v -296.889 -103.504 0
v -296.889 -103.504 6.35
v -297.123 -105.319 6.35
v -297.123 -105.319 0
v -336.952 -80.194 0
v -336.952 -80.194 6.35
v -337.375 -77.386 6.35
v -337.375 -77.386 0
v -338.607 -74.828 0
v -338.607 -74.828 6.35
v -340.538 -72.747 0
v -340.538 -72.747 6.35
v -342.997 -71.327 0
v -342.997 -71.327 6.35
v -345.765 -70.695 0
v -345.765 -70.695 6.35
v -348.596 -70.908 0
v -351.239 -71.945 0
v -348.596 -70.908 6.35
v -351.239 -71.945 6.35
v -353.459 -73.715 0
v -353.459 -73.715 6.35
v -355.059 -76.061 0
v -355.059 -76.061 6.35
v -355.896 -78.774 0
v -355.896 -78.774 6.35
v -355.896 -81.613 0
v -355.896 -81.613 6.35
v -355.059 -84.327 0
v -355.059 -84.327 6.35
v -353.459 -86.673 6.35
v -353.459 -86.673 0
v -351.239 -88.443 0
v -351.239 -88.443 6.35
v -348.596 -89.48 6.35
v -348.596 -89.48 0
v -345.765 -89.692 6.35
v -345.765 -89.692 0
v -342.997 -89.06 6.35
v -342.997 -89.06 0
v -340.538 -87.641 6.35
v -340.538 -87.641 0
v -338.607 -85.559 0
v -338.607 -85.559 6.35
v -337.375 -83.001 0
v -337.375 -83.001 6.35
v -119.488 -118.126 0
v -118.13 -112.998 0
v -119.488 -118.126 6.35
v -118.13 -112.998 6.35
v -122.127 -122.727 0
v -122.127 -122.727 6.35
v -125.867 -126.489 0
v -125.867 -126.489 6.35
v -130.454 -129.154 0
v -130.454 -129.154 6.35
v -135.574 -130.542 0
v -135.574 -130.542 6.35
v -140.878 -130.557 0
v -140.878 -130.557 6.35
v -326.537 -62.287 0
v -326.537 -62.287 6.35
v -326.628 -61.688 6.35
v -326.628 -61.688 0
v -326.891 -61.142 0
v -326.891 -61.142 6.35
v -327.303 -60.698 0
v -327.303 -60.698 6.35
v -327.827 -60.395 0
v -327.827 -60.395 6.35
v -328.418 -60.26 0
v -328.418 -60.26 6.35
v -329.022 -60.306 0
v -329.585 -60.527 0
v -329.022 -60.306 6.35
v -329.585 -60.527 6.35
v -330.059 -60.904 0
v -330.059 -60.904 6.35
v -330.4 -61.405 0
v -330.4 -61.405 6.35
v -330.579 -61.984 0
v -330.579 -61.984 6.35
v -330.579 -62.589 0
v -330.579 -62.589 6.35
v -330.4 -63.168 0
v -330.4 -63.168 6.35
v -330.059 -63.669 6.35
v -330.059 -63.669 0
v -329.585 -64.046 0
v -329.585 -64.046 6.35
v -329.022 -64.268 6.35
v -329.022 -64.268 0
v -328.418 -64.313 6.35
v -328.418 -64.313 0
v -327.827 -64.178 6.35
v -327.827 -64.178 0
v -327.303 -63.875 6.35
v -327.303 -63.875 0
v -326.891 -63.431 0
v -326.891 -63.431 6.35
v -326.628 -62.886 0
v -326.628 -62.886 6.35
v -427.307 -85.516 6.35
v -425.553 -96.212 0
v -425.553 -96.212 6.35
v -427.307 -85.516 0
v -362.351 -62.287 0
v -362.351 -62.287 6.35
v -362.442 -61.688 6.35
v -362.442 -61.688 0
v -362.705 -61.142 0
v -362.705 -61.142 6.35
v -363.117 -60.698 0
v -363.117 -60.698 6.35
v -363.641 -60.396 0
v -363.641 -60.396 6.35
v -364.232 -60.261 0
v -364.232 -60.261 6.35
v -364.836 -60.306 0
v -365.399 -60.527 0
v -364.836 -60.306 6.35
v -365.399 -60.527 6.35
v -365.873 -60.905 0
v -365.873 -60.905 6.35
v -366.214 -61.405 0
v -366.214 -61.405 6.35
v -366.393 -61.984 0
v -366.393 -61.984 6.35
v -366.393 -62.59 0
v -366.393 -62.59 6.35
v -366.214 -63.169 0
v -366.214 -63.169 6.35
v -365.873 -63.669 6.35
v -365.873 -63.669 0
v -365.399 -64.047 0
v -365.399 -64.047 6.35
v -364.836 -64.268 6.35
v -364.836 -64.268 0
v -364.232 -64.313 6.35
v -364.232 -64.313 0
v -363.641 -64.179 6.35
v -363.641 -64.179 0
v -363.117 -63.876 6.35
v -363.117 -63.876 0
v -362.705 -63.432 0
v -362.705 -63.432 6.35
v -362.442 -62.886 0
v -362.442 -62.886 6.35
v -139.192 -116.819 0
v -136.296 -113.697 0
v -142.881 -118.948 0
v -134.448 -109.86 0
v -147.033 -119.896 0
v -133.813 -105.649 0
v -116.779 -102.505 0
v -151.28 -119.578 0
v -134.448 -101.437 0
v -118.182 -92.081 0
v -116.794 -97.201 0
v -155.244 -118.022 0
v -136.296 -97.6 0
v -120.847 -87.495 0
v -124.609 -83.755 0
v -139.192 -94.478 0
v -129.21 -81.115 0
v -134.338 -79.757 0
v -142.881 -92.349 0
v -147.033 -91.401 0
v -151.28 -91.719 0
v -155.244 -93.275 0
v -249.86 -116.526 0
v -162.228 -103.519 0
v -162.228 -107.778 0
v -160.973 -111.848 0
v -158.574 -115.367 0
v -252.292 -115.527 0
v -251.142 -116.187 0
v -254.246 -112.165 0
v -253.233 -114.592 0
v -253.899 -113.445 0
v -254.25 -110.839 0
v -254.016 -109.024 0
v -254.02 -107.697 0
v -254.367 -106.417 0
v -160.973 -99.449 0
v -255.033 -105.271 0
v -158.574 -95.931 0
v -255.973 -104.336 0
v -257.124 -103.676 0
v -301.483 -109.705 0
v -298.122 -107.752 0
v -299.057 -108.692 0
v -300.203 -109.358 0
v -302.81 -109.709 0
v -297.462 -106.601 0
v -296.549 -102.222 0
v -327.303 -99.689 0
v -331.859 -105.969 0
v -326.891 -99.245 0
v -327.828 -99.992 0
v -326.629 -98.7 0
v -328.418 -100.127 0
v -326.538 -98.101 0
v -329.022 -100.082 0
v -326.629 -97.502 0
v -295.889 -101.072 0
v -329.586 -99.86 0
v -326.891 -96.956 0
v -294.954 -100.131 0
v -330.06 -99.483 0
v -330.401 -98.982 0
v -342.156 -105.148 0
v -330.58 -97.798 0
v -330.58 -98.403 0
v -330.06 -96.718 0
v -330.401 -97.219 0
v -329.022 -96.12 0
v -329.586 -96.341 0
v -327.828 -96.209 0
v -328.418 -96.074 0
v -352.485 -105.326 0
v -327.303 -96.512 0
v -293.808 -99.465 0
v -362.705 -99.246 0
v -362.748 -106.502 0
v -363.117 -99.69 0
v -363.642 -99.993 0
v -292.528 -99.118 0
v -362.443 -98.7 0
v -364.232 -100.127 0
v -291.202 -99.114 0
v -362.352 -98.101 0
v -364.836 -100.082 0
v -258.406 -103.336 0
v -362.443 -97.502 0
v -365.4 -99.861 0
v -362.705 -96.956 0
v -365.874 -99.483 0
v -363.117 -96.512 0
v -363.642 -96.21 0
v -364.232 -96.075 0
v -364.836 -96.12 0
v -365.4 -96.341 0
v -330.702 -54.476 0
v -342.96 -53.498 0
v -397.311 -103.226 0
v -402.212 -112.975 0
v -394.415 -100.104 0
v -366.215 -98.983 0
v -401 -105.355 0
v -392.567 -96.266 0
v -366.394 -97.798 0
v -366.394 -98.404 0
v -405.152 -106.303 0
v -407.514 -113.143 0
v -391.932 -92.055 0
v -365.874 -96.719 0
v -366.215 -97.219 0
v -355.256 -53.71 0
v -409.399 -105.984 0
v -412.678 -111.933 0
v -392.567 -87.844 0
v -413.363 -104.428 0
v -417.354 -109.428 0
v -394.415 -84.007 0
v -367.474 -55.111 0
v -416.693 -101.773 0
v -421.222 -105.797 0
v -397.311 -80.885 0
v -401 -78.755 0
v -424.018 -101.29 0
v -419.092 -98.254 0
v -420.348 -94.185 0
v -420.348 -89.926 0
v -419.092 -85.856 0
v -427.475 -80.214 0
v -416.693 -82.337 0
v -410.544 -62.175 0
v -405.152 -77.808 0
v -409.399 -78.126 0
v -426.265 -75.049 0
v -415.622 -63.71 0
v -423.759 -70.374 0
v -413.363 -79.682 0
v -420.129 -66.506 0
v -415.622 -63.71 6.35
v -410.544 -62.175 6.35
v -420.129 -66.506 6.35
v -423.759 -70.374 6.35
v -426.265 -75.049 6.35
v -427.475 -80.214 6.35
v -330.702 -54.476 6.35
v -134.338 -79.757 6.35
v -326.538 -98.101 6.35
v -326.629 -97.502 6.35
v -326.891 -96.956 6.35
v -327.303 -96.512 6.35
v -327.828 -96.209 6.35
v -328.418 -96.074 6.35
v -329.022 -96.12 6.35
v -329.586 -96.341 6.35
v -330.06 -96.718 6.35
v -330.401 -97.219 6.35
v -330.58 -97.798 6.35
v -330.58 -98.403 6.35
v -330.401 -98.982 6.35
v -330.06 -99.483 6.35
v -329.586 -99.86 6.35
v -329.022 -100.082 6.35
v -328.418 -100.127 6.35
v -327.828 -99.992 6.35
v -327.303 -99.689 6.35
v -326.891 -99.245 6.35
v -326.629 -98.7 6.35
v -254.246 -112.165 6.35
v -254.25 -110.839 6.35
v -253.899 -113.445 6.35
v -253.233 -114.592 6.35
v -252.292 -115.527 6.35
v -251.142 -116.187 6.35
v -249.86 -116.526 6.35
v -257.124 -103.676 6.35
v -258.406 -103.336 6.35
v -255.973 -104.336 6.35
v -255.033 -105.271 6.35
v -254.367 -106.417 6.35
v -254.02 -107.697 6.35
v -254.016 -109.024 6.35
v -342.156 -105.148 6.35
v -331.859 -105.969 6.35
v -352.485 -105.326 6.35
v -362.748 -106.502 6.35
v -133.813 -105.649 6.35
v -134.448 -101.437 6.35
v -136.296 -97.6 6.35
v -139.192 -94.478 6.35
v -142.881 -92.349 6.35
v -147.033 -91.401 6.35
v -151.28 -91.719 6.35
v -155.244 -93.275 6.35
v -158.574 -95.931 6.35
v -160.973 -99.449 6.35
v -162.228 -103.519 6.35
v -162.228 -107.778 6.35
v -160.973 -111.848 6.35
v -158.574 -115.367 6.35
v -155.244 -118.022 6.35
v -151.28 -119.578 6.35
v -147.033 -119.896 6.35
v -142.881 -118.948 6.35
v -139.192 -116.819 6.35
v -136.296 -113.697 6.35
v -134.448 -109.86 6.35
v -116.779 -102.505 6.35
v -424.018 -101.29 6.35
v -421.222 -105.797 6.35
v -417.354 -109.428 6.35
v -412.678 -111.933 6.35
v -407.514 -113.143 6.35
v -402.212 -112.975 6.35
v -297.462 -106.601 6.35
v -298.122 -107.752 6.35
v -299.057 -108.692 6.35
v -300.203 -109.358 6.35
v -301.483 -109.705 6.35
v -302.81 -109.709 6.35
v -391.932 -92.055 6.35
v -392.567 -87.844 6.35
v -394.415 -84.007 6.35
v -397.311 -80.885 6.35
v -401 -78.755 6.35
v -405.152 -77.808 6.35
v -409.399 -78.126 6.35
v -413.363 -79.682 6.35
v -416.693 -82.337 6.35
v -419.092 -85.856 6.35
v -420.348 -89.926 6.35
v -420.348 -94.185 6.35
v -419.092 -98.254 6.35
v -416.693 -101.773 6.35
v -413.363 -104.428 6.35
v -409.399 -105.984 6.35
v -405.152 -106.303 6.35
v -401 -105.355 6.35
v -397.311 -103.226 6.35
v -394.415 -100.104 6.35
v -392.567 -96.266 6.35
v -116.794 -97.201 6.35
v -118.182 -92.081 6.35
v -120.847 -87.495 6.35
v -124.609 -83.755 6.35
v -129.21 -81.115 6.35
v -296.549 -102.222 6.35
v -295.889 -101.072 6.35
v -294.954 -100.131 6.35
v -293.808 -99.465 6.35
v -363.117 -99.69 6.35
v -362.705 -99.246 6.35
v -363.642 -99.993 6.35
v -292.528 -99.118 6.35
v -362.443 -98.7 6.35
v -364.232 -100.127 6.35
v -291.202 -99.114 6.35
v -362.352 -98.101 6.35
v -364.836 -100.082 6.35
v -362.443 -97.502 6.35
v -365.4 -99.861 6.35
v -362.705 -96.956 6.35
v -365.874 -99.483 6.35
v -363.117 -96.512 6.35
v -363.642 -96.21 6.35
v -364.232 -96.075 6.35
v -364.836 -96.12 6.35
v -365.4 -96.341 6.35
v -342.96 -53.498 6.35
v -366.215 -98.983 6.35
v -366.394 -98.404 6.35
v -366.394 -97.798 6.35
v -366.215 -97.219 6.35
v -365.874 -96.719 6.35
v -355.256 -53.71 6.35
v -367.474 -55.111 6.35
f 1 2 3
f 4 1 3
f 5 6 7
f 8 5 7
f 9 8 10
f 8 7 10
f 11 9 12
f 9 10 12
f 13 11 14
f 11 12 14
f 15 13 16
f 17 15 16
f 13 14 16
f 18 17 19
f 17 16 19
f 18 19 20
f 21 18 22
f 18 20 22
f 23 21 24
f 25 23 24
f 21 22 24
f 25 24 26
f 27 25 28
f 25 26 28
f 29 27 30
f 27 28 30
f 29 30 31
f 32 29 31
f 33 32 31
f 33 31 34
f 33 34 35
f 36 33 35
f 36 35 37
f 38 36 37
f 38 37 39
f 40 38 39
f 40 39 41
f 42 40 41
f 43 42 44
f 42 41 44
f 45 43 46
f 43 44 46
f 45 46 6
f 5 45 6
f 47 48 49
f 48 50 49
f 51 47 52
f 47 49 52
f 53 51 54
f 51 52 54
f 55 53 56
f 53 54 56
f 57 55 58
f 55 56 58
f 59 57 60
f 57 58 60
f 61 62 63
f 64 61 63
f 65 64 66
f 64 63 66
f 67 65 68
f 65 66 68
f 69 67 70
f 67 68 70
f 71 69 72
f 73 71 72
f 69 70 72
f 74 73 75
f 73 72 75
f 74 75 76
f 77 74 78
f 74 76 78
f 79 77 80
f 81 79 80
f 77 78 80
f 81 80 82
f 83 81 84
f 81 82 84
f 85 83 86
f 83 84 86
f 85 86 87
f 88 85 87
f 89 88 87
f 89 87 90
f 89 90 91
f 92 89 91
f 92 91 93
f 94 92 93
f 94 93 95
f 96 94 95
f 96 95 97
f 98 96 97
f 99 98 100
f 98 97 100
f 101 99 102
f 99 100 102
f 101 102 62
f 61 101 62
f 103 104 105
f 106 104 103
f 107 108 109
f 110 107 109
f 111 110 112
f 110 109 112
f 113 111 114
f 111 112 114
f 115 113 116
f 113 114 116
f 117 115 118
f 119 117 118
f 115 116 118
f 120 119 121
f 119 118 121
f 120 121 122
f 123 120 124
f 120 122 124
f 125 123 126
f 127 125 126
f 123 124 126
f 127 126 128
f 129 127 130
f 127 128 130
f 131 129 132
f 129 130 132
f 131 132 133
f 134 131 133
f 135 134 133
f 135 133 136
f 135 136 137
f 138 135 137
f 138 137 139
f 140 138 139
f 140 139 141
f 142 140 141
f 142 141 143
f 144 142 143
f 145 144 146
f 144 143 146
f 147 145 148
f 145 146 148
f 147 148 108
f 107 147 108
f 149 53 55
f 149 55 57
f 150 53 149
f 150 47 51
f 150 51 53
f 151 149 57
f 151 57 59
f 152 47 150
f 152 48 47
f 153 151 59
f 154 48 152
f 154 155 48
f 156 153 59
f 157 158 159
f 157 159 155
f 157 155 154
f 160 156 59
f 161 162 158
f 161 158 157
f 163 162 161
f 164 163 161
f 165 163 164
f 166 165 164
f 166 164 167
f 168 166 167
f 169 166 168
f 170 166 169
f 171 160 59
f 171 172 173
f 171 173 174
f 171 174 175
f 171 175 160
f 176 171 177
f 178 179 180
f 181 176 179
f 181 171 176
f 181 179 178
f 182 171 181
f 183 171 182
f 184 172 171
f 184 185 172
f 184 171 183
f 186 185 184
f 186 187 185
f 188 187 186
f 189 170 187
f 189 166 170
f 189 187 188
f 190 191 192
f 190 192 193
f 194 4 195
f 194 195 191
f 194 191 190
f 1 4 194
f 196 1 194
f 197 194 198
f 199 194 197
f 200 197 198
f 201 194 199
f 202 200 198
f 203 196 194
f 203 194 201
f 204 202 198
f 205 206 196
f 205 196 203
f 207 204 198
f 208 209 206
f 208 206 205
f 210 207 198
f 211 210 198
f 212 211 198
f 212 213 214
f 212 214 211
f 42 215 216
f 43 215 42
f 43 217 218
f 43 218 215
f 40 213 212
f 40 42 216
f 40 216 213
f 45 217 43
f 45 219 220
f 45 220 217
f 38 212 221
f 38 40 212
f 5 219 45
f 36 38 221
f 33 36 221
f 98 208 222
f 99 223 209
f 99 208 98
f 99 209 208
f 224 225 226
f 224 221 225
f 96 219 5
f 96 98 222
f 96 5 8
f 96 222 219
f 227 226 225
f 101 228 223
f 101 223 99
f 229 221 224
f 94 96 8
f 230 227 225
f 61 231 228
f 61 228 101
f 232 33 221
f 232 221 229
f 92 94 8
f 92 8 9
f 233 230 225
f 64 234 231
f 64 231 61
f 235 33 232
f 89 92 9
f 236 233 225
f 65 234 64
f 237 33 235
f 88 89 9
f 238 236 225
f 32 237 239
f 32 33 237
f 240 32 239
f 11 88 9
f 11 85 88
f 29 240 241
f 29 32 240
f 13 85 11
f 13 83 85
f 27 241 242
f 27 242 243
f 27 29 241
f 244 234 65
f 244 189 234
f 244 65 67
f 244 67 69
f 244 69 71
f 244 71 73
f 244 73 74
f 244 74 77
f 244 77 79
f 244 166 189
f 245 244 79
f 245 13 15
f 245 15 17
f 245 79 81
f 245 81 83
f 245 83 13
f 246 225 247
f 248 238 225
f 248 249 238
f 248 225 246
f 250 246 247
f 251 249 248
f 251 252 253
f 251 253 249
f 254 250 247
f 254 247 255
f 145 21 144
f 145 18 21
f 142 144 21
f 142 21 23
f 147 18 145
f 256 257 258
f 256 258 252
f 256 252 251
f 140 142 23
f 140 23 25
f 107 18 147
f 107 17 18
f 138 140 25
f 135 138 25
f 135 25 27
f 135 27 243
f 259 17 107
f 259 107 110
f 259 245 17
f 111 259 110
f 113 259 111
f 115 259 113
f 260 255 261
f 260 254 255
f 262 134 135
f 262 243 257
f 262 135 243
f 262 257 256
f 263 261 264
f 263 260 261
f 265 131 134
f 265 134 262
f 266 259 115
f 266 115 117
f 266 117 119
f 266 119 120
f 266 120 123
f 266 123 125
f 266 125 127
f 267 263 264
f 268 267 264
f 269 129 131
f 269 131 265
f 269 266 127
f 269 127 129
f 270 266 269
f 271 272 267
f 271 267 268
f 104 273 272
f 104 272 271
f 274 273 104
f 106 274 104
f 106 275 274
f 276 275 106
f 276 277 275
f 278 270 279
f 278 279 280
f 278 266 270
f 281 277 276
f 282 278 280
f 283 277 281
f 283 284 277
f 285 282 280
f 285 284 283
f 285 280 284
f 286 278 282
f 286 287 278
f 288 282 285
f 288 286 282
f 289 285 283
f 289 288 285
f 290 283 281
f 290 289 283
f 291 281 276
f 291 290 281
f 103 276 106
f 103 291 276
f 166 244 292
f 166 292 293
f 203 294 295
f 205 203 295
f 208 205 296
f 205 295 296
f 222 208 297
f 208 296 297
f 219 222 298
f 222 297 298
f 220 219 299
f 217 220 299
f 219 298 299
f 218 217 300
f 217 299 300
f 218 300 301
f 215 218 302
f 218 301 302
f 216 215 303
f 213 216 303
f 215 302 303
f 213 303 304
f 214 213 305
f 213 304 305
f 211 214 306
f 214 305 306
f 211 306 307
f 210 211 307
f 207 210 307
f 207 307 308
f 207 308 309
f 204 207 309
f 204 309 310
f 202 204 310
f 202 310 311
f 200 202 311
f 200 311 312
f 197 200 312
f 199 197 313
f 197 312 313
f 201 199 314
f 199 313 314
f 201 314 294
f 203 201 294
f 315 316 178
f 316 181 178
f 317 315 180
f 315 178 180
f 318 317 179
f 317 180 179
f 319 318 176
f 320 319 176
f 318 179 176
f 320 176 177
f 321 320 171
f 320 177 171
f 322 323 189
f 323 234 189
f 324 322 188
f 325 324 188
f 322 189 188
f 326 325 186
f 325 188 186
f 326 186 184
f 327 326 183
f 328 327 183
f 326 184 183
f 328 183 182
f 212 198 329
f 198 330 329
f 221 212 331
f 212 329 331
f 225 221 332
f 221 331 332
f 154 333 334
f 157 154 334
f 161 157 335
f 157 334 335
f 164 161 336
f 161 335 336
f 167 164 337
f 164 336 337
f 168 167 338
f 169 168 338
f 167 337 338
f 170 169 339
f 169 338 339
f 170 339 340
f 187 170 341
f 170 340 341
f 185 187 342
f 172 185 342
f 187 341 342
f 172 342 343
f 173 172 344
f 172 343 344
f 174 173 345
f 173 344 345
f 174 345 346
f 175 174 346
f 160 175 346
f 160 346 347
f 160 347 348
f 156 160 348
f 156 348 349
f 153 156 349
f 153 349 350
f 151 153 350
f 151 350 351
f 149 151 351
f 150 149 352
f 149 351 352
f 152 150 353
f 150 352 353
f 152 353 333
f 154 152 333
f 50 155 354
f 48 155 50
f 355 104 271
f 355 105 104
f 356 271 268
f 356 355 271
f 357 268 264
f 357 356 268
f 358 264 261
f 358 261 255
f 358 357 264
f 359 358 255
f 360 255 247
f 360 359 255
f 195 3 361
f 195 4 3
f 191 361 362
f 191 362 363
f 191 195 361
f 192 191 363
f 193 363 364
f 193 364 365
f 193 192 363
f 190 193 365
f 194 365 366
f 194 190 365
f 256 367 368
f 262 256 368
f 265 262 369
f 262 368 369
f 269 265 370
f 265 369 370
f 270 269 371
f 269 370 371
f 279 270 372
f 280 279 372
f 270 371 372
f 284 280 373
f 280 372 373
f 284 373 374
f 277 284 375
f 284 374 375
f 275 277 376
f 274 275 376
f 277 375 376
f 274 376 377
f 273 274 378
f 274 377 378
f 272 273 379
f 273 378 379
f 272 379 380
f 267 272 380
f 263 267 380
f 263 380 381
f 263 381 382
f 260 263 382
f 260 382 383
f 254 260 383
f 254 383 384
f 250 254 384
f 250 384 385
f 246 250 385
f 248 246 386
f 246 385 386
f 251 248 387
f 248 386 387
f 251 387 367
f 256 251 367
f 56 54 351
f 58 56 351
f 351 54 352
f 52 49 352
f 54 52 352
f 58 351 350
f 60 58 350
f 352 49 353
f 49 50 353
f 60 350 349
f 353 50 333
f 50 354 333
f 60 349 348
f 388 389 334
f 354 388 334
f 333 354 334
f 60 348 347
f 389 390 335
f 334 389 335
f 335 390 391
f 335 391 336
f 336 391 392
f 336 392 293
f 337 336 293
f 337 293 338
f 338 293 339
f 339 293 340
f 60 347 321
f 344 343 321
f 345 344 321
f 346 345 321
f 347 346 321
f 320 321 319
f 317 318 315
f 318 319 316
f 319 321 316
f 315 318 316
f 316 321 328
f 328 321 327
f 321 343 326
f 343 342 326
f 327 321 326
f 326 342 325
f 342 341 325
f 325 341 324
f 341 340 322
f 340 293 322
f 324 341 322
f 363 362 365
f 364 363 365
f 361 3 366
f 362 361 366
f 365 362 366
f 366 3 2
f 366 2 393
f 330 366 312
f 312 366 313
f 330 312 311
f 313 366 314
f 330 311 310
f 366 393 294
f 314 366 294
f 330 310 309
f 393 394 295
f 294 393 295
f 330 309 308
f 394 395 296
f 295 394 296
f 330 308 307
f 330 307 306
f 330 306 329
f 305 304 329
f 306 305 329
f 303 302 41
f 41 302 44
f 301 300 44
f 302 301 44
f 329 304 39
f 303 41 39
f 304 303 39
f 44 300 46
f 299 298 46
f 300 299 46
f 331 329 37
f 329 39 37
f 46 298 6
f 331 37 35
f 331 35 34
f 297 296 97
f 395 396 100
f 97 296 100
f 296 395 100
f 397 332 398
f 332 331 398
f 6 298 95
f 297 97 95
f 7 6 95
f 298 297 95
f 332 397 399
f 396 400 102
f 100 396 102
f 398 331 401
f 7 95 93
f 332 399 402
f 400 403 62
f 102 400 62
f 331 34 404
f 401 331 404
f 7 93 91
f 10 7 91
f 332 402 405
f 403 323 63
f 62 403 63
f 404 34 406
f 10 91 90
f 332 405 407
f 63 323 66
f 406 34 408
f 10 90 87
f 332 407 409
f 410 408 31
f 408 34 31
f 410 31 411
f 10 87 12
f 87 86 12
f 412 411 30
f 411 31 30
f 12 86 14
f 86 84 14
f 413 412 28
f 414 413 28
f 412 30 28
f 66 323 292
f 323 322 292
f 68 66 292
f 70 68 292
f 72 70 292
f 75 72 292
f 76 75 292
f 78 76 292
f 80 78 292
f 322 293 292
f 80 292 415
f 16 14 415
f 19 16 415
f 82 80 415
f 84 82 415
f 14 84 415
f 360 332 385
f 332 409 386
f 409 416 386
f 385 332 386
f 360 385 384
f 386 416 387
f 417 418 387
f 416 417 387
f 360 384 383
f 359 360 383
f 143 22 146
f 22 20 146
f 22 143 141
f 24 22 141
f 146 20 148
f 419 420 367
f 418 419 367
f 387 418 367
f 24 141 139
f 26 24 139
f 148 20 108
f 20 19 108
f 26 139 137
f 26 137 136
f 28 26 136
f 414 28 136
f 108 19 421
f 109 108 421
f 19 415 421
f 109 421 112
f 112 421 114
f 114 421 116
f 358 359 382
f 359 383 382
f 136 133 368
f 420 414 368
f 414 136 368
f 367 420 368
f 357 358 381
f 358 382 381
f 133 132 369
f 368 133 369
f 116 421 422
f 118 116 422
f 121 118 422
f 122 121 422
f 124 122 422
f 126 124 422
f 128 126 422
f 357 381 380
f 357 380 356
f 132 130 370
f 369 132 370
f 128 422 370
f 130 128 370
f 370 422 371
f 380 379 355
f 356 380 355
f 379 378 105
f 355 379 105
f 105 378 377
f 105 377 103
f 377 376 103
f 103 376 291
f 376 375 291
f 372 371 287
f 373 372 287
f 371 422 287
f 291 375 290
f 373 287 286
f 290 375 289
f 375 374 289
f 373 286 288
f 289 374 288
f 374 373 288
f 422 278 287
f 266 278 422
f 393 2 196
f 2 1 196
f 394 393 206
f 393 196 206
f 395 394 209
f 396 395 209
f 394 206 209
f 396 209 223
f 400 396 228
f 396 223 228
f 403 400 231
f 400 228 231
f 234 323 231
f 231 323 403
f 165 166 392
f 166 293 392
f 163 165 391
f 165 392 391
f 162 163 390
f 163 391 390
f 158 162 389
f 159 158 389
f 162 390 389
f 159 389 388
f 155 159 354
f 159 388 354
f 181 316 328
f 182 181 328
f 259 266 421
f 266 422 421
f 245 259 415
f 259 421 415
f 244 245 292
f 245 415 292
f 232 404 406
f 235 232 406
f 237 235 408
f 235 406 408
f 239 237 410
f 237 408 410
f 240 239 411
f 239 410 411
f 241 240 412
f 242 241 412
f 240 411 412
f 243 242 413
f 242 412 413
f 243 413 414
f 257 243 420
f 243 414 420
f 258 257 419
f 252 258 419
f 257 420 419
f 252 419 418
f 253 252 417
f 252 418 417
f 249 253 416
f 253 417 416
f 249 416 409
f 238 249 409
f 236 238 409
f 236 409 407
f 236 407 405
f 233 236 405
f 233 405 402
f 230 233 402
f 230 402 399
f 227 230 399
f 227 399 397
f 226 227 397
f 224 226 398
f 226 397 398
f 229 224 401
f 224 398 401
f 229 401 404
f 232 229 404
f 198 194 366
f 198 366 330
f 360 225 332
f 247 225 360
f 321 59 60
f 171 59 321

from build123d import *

# Parameters (mm, degrees)
BOSS_EXTRUDE4_DEPTH = 6.35
SKETCH8_R           = 14.2875
SKETCH8_R_2         = 2.032
SKETCH8_R_3         = 9.525
CUT_EXTRUDE7_DEPTH  = 6.35
FILLET1_R           = 127
FILLET2_R           = 20.32
FILLET3_R           = 20.32
FILLET4_R           = 20.32
FILLET5_R           = 20.32
FILLET6_R           = 106.68
FILLET15_R          = 5.08
FILLET16_R          = 5.08
FILLET17_R          = 5.08
FILLET18_R          = 5.08


with BuildPart() as part:
    # Sketch6 → Boss-Extrude4 (new body)
    with BuildSketch(Plane.XY):
        Polygon((-430.595798314, -65.46403997), (-349.134252231, -52.10293935), (-114.184252231, -82.35181316), (-120.72454927, -133.15181316), (-347.342471816, -103.975661033), (-422.26372086, -116.26403997), align=None)
    extrude(amount=BOSS_EXTRUDE4_DEPTH)

    # Sketch8 → Cut-Extrude7 (cut)
    with BuildSketch(Plane.XY.offset(6.35)):
        with Locations((-406.219595957, -92.055134427)):
            Circle(SKETCH8_R)
        with Locations((-148.100562805, -105.64860282)):
            Circle(SKETCH8_R)
        with Locations((-364.383471272, -62.287100468)):
            Circle(SKETCH8_R_2)
        with Locations((-364.384308881, -98.101100468)):
            Circle(SKETCH8_R_2)
        with Locations((-328.570308884, -98.10061012)):
            Circle(SKETCH8_R_2)
        with Locations((-328.569471275, -62.28661013)):
            Circle(SKETCH8_R_2)
        with Locations((-346.476890078, -80.193855294)):
            Circle(SKETCH8_R_3)
        Polygon((-254.89844174, -115.877460566), (-253.367356027, -103.985163664), (-296.240101937, -98.465468917), (-297.77118765, -110.357765819), align=None)
    extrude(amount=-CUT_EXTRUDE7_DEPTH, mode=Mode.SUBTRACT)

    # Fillet1
    fillet1_edges = [part.edges().sort_by_distance(p)[0] for p in [
        (-349.134252231, -52.10293935, 3.175),
    ]]
    fillet(fillet1_edges, radius=FILLET1_R)

    # Fillet2
    fillet2_edges = [part.edges().sort_by_distance(p)[0] for p in [
        (-430.595798314, -65.46403997, 3.175),
    ]]
    fillet(fillet2_edges, radius=FILLET2_R)

    # Fillet3
    fillet3_edges = [part.edges().sort_by_distance(p)[0] for p in [
        (-422.26372086, -116.26403997, 3.175),
    ]]
    fillet(fillet3_edges, radius=FILLET3_R)

    # Fillet4
    fillet4_edges = [part.edges().sort_by_distance(p)[0] for p in [
        (-114.184252231, -82.35181316, 3.175),
    ]]
    fillet(fillet4_edges, radius=FILLET4_R)

    # Fillet5
    fillet5_edges = [part.edges().sort_by_distance(p)[0] for p in [
        (-120.72454927, -133.15181316, 3.175),
    ]]
    fillet(fillet5_edges, radius=FILLET5_R)

    # Fillet6
    fillet6_edges = [part.edges().sort_by_distance(p)[0] for p in [
        (-347.342471816, -103.975661033, 3.175),
    ]]
    fillet(fillet6_edges, radius=FILLET6_R)

    # Fillet15
    fillet15_edges = [part.edges().sort_by_distance(p)[0] for p in [
        (-254.89844174, -115.877460566, 3.175),
    ]]
    fillet(fillet15_edges, radius=FILLET15_R)

    # Fillet16
    fillet16_edges = [part.edges().sort_by_distance(p)[0] for p in [
        (-297.77118765, -110.357765819, 3.175),
    ]]
    fillet(fillet16_edges, radius=FILLET16_R)

    # Fillet17
    fillet17_edges = [part.edges().sort_by_distance(p)[0] for p in [
        (-296.240101937, -98.465468917, 3.175),
    ]]
    fillet(fillet17_edges, radius=FILLET17_R)

    # Fillet18
    fillet18_edges = [part.edges().sort_by_distance(p)[0] for p in [
        (-253.367356027, -103.985163664, 3.175),
    ]]
    fillet(fillet18_edges, radius=FILLET18_R)


solid = part.part
